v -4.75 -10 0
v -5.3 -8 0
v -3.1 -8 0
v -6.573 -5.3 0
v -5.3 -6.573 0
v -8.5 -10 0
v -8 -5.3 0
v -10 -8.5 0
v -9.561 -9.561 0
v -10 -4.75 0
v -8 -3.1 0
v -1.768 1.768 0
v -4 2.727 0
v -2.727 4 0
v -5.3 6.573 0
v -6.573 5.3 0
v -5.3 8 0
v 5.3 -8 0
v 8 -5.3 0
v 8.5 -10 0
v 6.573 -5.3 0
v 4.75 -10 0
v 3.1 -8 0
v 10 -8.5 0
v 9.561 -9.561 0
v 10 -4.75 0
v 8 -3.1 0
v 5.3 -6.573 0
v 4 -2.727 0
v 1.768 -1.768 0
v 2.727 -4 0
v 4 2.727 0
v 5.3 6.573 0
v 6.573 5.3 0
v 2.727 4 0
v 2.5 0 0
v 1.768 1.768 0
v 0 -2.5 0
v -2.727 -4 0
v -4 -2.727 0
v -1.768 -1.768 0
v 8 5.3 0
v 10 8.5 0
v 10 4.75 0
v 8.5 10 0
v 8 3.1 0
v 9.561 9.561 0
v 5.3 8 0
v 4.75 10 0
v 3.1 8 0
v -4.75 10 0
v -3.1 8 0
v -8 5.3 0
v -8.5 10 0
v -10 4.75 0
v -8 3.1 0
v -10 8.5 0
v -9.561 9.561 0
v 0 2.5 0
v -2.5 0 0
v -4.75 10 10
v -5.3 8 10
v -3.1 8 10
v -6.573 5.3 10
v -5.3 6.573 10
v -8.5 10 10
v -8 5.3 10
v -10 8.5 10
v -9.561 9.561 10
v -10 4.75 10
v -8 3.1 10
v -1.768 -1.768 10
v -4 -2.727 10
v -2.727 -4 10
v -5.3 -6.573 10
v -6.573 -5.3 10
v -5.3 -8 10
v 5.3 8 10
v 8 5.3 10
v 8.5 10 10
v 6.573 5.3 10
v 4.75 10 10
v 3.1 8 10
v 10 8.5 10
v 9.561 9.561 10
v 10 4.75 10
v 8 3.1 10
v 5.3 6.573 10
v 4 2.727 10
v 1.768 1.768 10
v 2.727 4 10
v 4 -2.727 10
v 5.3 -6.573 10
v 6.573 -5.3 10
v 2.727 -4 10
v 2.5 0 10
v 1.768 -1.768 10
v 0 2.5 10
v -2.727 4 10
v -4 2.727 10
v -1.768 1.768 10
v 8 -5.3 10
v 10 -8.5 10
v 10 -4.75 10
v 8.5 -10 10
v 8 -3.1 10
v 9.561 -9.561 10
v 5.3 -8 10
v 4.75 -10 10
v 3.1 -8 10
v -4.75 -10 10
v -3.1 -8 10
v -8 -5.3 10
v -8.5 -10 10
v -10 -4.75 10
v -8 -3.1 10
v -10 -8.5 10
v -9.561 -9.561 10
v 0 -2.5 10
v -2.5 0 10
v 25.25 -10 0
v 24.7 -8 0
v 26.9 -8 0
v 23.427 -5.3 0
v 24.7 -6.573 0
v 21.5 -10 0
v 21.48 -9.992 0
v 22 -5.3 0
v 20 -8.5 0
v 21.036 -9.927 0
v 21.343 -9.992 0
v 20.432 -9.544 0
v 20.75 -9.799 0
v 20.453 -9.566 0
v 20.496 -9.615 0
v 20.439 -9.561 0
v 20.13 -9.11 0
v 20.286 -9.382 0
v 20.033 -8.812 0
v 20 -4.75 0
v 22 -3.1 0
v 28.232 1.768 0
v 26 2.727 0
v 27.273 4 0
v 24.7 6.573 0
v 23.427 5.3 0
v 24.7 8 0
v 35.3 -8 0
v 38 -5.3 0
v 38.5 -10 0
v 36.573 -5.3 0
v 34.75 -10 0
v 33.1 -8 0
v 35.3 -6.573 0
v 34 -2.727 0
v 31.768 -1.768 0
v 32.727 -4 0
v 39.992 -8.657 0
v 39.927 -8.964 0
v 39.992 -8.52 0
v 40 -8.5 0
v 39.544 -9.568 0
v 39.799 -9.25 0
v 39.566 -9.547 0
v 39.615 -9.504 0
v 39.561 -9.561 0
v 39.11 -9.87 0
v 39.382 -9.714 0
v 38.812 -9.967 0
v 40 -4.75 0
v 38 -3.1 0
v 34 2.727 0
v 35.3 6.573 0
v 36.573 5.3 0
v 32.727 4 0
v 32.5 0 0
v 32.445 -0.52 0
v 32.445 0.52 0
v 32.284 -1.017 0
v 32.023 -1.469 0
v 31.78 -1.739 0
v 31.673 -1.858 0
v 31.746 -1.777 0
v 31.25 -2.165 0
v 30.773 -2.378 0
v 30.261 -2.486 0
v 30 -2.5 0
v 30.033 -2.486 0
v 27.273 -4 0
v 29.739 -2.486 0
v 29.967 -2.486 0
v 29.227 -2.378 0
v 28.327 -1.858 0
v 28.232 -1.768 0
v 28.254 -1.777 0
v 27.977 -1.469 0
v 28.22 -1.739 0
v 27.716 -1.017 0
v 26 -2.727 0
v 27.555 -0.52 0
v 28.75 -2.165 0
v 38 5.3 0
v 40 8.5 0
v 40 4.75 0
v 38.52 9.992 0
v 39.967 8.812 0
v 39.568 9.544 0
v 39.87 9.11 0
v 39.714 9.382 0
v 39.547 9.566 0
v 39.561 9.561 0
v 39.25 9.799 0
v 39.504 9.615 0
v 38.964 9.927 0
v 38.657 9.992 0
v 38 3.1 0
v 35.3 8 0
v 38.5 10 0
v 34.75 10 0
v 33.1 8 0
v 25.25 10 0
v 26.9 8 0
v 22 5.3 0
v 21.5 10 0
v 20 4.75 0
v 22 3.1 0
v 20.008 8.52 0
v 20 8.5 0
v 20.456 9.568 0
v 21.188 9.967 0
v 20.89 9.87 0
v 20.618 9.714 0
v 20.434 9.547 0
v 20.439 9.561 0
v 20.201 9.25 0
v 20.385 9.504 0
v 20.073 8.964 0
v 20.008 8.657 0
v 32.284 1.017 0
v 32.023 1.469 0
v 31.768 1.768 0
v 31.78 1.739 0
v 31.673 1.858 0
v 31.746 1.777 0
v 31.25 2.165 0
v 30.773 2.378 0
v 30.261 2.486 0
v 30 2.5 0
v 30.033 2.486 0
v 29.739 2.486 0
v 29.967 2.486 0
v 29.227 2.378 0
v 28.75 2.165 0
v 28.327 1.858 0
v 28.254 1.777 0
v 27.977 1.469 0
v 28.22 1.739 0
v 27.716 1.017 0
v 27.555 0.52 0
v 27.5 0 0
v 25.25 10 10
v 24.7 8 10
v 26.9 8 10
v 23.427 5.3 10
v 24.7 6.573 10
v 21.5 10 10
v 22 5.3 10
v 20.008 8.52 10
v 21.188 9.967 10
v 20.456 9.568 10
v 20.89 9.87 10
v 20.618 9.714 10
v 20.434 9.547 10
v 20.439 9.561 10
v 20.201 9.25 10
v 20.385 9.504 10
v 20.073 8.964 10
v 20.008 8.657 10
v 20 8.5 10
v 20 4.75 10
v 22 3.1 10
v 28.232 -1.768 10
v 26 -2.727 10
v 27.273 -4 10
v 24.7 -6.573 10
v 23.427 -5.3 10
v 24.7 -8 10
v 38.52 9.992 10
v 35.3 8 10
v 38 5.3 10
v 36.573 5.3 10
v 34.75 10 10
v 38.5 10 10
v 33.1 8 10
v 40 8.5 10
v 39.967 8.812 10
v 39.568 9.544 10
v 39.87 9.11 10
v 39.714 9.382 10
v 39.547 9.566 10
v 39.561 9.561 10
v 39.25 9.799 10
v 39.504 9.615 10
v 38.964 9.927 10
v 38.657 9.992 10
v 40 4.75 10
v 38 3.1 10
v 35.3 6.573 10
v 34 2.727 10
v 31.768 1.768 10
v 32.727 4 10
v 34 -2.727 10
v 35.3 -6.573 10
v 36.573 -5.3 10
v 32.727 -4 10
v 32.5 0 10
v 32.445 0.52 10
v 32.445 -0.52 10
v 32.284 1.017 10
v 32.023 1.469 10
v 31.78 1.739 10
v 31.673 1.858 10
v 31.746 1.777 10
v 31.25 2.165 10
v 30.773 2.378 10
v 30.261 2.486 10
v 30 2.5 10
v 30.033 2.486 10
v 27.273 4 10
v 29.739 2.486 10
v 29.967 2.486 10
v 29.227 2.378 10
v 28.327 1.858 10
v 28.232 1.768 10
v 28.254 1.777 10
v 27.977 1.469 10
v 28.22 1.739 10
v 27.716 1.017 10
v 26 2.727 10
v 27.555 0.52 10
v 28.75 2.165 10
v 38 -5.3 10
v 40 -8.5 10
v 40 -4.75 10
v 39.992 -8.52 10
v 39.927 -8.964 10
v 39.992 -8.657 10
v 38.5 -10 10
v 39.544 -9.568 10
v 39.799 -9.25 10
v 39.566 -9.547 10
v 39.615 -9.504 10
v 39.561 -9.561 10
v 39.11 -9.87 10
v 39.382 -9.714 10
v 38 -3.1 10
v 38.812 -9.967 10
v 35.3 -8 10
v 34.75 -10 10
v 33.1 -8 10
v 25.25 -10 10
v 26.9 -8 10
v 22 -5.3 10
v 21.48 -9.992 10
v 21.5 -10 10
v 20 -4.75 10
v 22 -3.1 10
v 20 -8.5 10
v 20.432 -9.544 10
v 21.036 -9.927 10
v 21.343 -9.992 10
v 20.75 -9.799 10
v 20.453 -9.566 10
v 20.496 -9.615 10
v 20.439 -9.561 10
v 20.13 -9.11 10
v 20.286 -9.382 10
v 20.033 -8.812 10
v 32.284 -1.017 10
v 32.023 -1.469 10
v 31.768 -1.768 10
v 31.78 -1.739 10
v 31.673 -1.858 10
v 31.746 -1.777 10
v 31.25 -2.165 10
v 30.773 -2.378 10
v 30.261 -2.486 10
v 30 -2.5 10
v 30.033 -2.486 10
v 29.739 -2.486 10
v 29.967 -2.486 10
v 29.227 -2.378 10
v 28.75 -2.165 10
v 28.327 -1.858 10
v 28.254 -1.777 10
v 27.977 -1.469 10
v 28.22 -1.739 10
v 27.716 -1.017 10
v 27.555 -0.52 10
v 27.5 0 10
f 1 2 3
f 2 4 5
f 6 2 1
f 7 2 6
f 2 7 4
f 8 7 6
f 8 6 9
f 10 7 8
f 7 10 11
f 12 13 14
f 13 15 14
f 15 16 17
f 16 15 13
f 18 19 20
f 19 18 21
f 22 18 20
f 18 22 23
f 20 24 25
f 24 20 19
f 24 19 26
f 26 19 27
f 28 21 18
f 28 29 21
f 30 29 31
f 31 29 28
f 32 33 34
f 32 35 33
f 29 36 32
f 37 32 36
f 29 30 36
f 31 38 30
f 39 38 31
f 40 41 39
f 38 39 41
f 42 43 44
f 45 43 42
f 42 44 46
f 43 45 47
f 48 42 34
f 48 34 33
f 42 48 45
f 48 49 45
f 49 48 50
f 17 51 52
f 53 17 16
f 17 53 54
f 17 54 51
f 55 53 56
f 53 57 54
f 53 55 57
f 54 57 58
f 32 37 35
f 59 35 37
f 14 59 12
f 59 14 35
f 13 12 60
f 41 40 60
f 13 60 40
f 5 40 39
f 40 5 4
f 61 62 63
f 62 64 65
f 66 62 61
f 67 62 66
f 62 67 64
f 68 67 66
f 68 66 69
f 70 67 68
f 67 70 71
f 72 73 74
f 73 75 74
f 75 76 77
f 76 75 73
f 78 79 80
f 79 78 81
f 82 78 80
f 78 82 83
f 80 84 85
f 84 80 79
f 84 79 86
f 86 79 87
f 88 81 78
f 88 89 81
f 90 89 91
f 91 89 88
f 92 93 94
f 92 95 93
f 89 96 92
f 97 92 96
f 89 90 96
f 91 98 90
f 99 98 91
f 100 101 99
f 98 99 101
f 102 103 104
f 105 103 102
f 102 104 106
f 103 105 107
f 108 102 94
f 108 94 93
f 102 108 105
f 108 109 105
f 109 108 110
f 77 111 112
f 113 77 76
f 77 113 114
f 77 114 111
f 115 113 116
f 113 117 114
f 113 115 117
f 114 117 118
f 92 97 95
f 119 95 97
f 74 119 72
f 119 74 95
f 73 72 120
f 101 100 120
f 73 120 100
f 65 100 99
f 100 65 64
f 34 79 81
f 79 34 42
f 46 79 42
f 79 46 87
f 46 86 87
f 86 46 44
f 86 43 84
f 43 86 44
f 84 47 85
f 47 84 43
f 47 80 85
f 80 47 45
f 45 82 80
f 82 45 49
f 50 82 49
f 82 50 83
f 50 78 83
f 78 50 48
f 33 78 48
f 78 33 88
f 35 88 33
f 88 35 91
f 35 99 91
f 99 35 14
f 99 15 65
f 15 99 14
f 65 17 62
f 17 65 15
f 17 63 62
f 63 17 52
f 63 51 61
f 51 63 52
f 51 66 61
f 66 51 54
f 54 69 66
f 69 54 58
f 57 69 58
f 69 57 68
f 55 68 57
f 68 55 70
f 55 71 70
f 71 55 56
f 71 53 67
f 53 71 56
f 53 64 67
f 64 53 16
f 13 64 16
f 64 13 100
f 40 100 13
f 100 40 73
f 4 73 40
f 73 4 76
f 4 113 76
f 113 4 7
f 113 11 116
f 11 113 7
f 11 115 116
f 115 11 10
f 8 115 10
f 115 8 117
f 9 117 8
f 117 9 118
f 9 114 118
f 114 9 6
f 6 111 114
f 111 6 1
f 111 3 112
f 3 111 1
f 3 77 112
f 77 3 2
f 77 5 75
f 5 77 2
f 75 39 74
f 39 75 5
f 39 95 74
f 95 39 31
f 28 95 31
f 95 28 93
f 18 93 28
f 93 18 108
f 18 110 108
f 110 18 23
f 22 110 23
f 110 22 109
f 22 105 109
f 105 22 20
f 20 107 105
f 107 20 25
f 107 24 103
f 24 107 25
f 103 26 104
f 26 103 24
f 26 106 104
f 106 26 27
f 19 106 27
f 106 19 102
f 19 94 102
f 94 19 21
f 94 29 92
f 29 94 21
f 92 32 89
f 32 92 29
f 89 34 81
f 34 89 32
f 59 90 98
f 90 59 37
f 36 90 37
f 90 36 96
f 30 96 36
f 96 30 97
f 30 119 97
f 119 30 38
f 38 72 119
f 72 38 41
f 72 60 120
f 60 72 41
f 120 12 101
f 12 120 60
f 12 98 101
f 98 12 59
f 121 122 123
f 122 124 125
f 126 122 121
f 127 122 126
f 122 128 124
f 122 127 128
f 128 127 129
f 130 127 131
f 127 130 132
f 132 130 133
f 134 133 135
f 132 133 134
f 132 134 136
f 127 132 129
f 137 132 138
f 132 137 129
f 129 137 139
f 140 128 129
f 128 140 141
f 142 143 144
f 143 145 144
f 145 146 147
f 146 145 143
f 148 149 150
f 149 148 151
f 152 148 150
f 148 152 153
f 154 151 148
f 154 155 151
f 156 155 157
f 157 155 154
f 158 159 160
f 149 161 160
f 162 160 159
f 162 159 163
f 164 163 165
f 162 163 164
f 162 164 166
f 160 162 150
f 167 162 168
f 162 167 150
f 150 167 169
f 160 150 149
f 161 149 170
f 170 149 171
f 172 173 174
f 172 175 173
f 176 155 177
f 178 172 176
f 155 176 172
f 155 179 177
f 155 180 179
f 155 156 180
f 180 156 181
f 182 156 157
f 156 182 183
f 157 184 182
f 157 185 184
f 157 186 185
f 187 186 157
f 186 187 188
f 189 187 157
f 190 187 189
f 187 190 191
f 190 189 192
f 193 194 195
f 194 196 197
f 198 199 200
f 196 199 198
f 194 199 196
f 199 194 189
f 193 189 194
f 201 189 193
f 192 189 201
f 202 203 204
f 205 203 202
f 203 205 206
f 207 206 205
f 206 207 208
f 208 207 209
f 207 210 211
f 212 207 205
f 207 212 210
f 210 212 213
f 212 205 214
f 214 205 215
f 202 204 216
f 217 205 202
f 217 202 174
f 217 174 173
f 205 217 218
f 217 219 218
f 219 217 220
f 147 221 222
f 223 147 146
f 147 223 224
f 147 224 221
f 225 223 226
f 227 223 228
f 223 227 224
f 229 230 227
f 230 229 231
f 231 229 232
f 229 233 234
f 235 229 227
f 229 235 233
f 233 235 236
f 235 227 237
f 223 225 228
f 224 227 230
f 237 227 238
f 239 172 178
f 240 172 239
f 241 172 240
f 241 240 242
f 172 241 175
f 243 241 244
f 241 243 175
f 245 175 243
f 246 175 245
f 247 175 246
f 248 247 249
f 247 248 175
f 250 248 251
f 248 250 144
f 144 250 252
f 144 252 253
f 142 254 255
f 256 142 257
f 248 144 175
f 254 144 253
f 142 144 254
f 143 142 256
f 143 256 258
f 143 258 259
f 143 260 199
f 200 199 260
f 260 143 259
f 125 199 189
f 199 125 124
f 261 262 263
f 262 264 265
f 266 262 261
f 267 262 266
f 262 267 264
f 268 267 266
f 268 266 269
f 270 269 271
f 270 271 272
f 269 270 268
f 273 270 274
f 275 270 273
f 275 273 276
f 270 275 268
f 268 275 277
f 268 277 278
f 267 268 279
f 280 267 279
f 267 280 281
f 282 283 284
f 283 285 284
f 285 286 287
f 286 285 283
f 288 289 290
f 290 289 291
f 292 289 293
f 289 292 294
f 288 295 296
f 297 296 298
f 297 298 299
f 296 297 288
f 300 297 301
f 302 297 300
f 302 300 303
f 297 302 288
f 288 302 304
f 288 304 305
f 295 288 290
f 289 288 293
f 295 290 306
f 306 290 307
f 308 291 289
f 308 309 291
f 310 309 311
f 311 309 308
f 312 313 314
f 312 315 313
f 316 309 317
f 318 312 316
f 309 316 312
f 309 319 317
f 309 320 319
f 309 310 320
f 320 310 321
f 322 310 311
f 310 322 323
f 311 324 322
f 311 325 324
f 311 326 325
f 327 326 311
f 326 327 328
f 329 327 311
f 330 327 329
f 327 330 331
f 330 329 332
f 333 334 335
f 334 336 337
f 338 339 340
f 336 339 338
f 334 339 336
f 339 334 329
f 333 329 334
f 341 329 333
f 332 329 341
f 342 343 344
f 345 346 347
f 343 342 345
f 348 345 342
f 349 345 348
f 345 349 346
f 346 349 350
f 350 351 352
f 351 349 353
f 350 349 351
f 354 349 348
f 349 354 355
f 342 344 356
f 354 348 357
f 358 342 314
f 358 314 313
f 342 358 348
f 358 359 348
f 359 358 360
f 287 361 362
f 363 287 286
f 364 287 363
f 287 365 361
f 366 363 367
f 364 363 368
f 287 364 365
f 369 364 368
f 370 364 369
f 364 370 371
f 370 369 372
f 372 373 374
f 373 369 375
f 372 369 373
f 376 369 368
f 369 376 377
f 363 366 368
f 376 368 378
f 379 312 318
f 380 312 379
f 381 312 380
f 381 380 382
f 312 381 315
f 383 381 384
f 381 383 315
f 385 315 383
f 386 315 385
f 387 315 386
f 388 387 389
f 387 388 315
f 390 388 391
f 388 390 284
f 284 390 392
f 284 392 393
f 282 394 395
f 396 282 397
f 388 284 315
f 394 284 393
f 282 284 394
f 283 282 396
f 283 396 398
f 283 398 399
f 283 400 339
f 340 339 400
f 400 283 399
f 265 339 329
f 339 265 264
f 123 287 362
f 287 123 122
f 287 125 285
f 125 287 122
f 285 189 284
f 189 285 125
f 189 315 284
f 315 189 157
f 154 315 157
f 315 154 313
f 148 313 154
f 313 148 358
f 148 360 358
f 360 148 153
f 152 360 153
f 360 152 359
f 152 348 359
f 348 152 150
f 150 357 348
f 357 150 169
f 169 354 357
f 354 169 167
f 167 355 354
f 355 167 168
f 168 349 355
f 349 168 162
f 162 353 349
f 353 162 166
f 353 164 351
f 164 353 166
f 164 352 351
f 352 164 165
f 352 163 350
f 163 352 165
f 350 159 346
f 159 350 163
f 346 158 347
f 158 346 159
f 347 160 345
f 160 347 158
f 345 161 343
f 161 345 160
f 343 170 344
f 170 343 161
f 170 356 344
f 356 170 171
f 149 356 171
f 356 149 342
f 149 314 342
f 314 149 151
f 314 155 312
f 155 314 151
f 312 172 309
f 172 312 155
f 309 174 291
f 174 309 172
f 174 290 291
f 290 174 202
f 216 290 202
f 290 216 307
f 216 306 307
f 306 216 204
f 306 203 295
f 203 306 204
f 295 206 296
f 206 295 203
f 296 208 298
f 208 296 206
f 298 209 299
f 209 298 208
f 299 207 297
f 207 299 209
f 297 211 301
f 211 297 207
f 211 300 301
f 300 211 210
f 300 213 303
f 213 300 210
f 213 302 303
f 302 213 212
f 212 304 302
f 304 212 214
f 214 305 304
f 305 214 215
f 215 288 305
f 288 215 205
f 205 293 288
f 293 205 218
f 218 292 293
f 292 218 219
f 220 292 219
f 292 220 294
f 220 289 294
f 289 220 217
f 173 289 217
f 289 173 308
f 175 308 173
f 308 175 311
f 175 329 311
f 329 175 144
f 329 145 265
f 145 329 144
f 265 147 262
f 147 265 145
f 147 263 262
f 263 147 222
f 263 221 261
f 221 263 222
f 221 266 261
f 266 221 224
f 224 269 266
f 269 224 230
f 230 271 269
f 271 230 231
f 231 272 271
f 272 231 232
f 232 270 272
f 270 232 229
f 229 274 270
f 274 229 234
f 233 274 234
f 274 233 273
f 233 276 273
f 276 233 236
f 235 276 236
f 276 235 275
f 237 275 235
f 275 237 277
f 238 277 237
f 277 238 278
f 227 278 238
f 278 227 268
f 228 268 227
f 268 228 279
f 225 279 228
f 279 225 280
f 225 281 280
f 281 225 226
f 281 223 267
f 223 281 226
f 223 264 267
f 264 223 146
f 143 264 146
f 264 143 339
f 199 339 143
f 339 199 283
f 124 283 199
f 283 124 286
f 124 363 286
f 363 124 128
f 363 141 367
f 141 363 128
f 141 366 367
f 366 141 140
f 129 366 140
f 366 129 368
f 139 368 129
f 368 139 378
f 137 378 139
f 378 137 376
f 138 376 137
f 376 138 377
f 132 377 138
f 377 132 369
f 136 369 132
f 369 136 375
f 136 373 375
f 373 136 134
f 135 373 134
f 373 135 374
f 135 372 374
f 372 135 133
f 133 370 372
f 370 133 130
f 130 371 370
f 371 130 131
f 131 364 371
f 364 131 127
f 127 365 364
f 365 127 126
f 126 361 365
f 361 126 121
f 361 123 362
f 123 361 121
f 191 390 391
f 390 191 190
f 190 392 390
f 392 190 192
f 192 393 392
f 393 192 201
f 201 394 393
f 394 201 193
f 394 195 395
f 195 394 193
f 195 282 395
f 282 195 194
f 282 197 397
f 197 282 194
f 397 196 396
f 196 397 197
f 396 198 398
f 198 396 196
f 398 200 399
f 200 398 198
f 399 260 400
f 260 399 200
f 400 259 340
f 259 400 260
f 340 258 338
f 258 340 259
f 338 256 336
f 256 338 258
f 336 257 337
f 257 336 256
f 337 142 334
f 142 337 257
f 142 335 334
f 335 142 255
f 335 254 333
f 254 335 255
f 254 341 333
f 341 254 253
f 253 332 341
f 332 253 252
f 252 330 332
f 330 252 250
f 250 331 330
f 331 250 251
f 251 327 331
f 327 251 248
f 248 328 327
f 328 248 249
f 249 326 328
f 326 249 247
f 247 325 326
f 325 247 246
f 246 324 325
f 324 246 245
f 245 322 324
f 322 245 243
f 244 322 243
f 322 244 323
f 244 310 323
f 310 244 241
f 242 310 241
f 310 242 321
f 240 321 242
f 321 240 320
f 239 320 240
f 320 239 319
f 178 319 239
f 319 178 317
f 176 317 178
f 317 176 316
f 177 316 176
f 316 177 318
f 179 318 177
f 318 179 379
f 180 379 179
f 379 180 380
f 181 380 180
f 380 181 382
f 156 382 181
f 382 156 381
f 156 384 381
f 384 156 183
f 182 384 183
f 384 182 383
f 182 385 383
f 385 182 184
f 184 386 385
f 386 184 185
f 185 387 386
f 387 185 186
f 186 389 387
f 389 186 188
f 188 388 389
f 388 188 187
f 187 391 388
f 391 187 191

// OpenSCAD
// Aleksandr Saechnikov 17 june 2015

extrusion_profile_20x20_v_slot(size = 20, height = 10);
translate([30, 0, 0]) extrusion_profile_20x20_v_slot_smooth(size = 20, height = 10);

$fn = 30;

module extrusion_profile_20x20_v_slot(size = 20, height = 10) {
	echo("2020 profile ", height);
	color([0.7, 0.7, 0.7]) linear_extrude(height = height) {
		union() {
			extrusion_profile_20x20_v_slot_part(size);
			rotate([0, 0, 90]) extrusion_profile_20x20_v_slot_part(size);
			rotate([0, 0, 180]) extrusion_profile_20x20_v_slot_part(size);
			rotate([0, 0, 270]) extrusion_profile_20x20_v_slot_part(size);
		}
	}
}

module extrusion_profile_20x20_v_slot_part(size = 20) {
	d = 5;
	r = 1.5;
	s1 = 1.8;
	s2 = 2;
	s3 = 6;
	s4 = 6.2;
	s5 = 9.5;
	s6 = 10.6;
	s7 = 20;

	reSize = size / 20; // Scalling

	k0 = 0;
	k1 = d * 0.5 * cos(45) * reSize;
	k2 = d * 0.5 * reSize;
	k3 = ((s7 * 0.5 - s3) - s1 * 0.5 * sqrt(2)) * reSize;
	k4 = s4 * 0.5 * reSize;
	k5 = (s7 * 0.5 - s3) * reSize;
	k6 = s6 * 0.5 * reSize;
	k7 = (s6 * 0.5 + s1 * 0.5 * sqrt(2)) * reSize;
	k8 = (s7 * 0.5 - s2) * reSize;
	k9 = s5 * 0.5 * reSize;
	k10 = s7 * 0.5 * reSize;
	k10_1 = k10 - r * (1 - cos(45)) * reSize;
	k10_2 = k10 - r * reSize;

	polygon(points = [
		[k1, k1],
		[k0, k2],
		[k0, k5],
		[k3, k5],
		[k6, k7],
		[k6, k8],
		[k4, k8],
		[k9, k10],
		[k10_2, k10],
		[k10_1, k10_1],
		[k10, k10_2],
		[k10, k9],
		[k8, k4],
		[k8, k6],
		[k7, k6],
		[k5, k3],
		[k5, k0],
		[k2, k0]
	]);
}

module extrusion_profile_20x20_v_slot_smooth(size = 20, height = 10) {
	linear_extrude(height = height) {
		difference() {
			union() {
				extrusion_profile_20x20_v_slot_part_smooth(size);
				rotate([0, 0, 90]) extrusion_profile_20x20_v_slot_part_smooth(size);
				rotate([0, 0, 180]) extrusion_profile_20x20_v_slot_part_smooth(size);
				rotate([0, 0, 270]) extrusion_profile_20x20_v_slot_part_smooth(size);
			}
			circle([0, 0], r = size / 20. * 2.5);
		}
	}
}

module extrusion_profile_20x20_v_slot_part_smooth(size = 20) {
	r_center = 0.5 * size - 1.5 * size / 20;
	union() {
		translate([r_center, r_center]) circle(r = 1.5 * size / 20);
		extrusion_profile_20x20_v_slot_part(size);
	}
}
